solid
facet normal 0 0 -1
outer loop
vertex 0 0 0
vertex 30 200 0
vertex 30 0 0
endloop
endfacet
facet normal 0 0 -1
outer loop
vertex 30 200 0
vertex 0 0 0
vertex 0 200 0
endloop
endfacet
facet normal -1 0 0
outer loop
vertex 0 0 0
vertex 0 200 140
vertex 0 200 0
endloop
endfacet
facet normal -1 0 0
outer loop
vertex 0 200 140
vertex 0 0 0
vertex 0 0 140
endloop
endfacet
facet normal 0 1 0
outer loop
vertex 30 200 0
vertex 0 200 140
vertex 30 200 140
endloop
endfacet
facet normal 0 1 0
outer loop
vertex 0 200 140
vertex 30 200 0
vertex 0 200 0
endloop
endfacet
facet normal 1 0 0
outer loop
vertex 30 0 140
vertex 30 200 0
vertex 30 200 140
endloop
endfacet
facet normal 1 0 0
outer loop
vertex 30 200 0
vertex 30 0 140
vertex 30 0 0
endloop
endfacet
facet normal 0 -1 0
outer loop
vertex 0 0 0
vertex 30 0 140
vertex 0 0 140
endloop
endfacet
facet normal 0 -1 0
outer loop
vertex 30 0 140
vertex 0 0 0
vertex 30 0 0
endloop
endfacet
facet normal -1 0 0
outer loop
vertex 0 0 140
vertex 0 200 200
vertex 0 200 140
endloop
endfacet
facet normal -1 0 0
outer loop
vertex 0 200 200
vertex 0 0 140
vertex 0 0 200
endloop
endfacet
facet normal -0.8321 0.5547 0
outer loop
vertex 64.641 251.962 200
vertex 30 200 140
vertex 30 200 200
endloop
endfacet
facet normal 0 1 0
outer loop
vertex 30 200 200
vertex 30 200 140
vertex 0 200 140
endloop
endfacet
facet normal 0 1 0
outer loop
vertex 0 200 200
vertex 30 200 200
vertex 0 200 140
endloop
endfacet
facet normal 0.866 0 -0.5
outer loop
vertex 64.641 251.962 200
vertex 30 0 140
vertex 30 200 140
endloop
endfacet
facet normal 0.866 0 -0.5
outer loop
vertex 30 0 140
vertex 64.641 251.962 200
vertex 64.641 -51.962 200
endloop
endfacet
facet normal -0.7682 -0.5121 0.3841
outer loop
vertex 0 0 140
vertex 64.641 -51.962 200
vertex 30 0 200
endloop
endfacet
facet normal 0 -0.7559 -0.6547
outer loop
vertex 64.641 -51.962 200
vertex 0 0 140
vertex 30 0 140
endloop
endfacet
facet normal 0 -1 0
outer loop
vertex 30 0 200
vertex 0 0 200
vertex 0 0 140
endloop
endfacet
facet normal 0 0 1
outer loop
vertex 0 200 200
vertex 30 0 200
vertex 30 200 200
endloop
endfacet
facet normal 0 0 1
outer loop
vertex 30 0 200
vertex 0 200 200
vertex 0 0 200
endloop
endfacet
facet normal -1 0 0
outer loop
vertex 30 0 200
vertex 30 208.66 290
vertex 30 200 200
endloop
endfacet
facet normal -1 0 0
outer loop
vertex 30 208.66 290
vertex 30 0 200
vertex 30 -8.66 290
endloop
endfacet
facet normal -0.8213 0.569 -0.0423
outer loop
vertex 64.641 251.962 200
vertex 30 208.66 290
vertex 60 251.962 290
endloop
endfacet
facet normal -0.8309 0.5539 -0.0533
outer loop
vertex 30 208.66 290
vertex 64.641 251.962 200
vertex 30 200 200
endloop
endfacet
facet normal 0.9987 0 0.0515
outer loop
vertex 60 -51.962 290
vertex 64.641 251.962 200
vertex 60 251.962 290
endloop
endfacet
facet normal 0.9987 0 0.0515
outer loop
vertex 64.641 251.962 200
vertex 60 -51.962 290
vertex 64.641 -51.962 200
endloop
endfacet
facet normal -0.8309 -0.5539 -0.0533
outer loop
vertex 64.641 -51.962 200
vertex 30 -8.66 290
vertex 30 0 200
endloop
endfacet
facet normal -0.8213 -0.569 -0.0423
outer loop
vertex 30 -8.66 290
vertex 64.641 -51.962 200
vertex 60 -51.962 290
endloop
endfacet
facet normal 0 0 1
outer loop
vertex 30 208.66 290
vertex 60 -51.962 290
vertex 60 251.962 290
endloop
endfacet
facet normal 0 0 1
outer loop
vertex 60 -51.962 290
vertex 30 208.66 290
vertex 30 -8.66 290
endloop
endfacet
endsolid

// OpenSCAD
height = 200;
width = 200;
holes = 0;
spacing =3;
angle = 00;
wall_thickness = 30;
point_up = true;
mitre= 30;


hexwand(width = width,  h=height, num_holes=holes, angle=angle, w= wall_thickness, spacing = spacing, point_up = point_up, mitre=mitre );

module hexwand(width = 10, h=10, w=2, num_holes= 5, angle=0, spacing = 1, point_up=false, center= false, mitre = 90)
{
  ver_sh = (num_holes >0)?h:h-2*w;
  ver_sp = h+3*w;
  d_ver = 2*w*tan(30);

  mitre0 = (false)? w*cos(mitre):0;
  mitre1 = (mitre != 90)? w*cos(mitre):0;
  mitre2 = (mitre != 90)? 2*w*cos(mitre):0;

  wand_poly_points = [
    [0,0,0], [0,width,0], [w,width+mitre0,0], [w,-mitre0,0], //Grund fläche 0 1 2 3

    [ver_sh*sin(angle),-ver_sh*sin(angle),ver_sh], //Start verjüngung 4
[ver_sh*sin(angle),width+ver_sh*sin(angle),ver_sh],  // 5
    [w+ver_sh*sin(angle),width+ver_sh*sin(angle)+mitre0,ver_sh], /// 6
    [w+ver_sh*sin(angle),-ver_sh*sin(angle)-mitre0,ver_sh], //Ende verjüngung 7 

    if(num_holes <=0)[h*sin(angle),-h*sin(angle),h], //wandhöhe 8
    if(num_holes <=0)[h*sin(angle),width+h*sin(angle),h],  // 9
    if(num_holes <=0)[w+h*sin(angle),width+h*sin(angle)+mitre0,h],  // 12
    if(num_holes <=0)[w+h*sin(angle),-h*sin(angle)-mitre0,h], //wandhöhe 13
    if(num_holes <=0)[w+h*sin(angle)+d_ver,width+h*sin(angle)+mitre2,h],  //10
    if(num_holes <=0)[w+h*sin(angle)+d_ver,-h*sin(angle)-mitre2,h], //11

    if(num_holes <=0)[w+ver_sp*sin(angle),-ver_sp*sin(angle)-mitre1/3,ver_sp], 
    if(num_holes <=0)[w+ver_sp*sin(angle),width+ver_sp*sin(angle)+mitre1/3,ver_sp], 
    if(num_holes <=0)[2*w+ver_sp*sin(angle),width+ver_sp*sin(angle)+mitre2,ver_sp], 
    if(num_holes <=0)[2*w+ver_sp*sin(angle),-ver_sp*sin(angle)-mitre2,ver_sp], //Start verjüngung 
    ];

  wand_poly_faces = [
    [0,3,2,1], //Grundfläche
    [0,1,5,4], //front
    [1,2,6,5],  //Seite rechts
    [2,3,7,6], //hinten
    [3,0,4,7],  //Seite links
		//-------------  wandhöhe
    if(num_holes <=0) [4,5,9,8], //front
				 //[5,6,10,9],  //Seite rechts komplett
    if(num_holes <=0)[5,6,12,10],  //Seite rechts
    if(num_holes <=0)[5,10,9],  //Seite rechts
    if(num_holes <=0)[6,7,13,12], //hinten
    if(num_holes <=0)//[7,4,8,11],  //Seite links komplett
      if(num_holes <=0)[7,4,11,13],  //Seite links
    if(num_holes <=0)[4,8,11],  //Seite links dreieck
    (num_holes <=0)?[8,9,10,11]:[4,5,6,7], //Abschluss Wandhöhe
					   //[8,9,10,11], //Abschluss Wandhöhe
					   //-------------  Überlaufhöhe
    if(num_holes <=0)[11,10,15,14], //front
    if(num_holes <=0)[10,12,16,15],  //Seite rechts
    if(num_holes <=0)[12,13,17,16], //hinten
    if(num_holes <=0)[11,14,17,13],  //Seite links
    if(num_holes <=0)[14,15,16,17], //Abschluss Überlaufhöhe
    ];
  difference()
  {
    translate([0,center?-0.5*width:0,0])
      polyhedron(points=wand_poly_points, faces=wand_poly_faces);
    if(num_holes >0)
   {
     rotate([0,angle,0])
       rotate([90,0,90])
       linear_extrude(height = 3*w, center = true)
       hexagon_pattern(width = width, height = h, num_cols = num_holes, spacing = spacing, point_up = point_up);
   }
 }

}

  function hexagon_points(radius = 1, point_up = true, z= -1, pos = [0,1,2], xoff = 0, yoff=0, center = [true,true,true], half = 0)= 
  let(
      angles = [ for (i = [0:5]) (i * 60 + (point_up ? 30 : 0)) ], 
      xoff=xoff+(center[0]?0:point_up?(half==1? 0:radius*cos(30)):radius),  
      yoff = yoff+ (center[1]?0:point_up?radius:(half==1?0:radius*cos(30))) )
  [
  for (w = angles)
  let(
      rawx=radius * cos(w),rawy=radius * sin(w), 
      x = point_up? (half == -1?(rawx <=0?rawx:0) : half == 1?(rawx >=0?rawx:0):rawx):rawx ,
      y = point_up? rawy : (half == -1?(rawy <=0?rawy:0) : half == 1?(rawy >=0?rawy:0):rawy),
      result = [x+xoff, y+yoff, if(z>=0) z]
     ) 
  [
    pos[0]== 0?result.x:pos[0]== 1?result.y:result.z,
    pos[1]== 0?result.x:pos[1]== 1?result.y:result.z,
    if(z >=0) pos[2]== 0?result.x:pos[2]== 1?result.y:result.z,
  ]
  ];



  module hexagon(radius = 1, point_up = true, center = [true,true,true], xoff = 0, yoff=0, half=0) {
    angles = [
      for (i = [0:5]) (i * 60 + (point_up ? 30 : 0))
    ];
    points = hexagon_points(radius = radius, point_up = point_up, center = center, xoff=xoff, yoff=yoff, half=half);
    polygon(points = points);
  }


module hexagon_pattern(width = 10, height = 10, num_cols = 5, spacing = 1, point_up = false) 
{
  radius = point_up? (width-(num_cols+1)*spacing)/(2*num_cols*cos(30)):   (width-(num_cols+1)*spacing)/(2+(num_cols-1)*(1+sin(30)));
  hexr = radius*cos(30);
  //assert(point_up?(2*hexr+spacing)*num_cols < width:(2*radius+spacing)*num_cols < width);

  num_rows = point_up? (height+spacing) / (3 * radius/2 + spacing)
    :2*floor((height / (2 * radius * cos(30) + spacing))/2)+1;

  hexgrid_width = let( pairs = floor(num_cols/2), impairs = num_cols - 2*pairs, hexcount = 2*pairs+1*impairs)
    point_up?  num_cols*(2*hexr+spacing)-spacing
    :
    pairs*(3*radius+2*spacing)+ impairs*radius+spacing ;

  xoff = point_up?((width-hexgrid_width)/2): (width-hexgrid_width)/2;

  for (row = [0:num_rows - 1]) {
    let (oddrow = row % 2 == 1)
      for (col = [0:point_up?(oddrow? num_cols:num_cols - 1): num_cols - 1]) {
	oddcol = col % 2 == 1;
	yoff = point_up? 0
	  :(oddcol?radius * cos(30):0 );
	xpos = point_up? 
	  oddrow?col *( 2*hexr + spacing)-( hexr)
	  :col *(2*hexr + spacing)
	  :oddcol?col *( radius+radius*sin(30) + 1*spacing):col/2 *(3*radius+2*spacing);
	x = point_up?
	  (oddrow? xpos+xoff-spacing/2:xpos+xoff)
	  :xpos+xoff;
	y = point_up?row * (radius*3/2+spacing )+yoff:row * (2 * hexr+spacing )+ yoff;

	difference()
	{
	  translate([point_up?((oddrow && col == 0)?(hexr+x):x):x, y, 0])
	    color(oddrow?"red":oddcol?"blue":"yellow")
	    hexagon(radius= radius, point_up = point_up, center = [false,false,true], half=point_up?((oddrow && col == 0)?1:(oddrow && col == num_cols )?-1:0): (y+2*radius>height)?-1:0  );
	  union()
	  {
	    if(x<0)translate( [-radius+spacing,y-1,0]) square([radius,2*radius+2]);
	    if(x+hexr>width-spacing)translate( [width-spacing,y-1,0]) square([10*radius,2*radius+2]);
	  }
	}
      }
  }
}
